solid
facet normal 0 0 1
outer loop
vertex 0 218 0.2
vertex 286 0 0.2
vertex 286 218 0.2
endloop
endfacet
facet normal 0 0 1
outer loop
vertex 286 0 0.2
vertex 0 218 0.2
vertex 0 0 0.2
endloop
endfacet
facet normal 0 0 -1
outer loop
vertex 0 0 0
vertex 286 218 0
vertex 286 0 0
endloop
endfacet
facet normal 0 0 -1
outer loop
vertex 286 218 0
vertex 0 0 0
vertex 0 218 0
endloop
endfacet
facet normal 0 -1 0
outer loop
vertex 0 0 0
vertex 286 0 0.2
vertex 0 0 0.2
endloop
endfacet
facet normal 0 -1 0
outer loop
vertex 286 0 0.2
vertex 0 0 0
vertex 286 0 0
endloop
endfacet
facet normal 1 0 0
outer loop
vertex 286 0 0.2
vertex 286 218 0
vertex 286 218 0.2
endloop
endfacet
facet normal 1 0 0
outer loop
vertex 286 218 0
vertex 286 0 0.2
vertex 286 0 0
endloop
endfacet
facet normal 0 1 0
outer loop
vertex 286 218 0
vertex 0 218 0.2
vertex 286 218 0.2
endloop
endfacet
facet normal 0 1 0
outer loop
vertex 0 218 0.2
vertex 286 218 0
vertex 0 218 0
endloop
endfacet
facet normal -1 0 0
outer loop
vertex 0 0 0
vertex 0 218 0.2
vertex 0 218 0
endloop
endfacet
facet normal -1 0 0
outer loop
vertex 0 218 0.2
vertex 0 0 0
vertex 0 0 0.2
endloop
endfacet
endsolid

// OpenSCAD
$fa=4; $fs=0.4;
color("#000000") translate([0.000,0.000,0.000]) cube([286.000,218.000,0.200]);
